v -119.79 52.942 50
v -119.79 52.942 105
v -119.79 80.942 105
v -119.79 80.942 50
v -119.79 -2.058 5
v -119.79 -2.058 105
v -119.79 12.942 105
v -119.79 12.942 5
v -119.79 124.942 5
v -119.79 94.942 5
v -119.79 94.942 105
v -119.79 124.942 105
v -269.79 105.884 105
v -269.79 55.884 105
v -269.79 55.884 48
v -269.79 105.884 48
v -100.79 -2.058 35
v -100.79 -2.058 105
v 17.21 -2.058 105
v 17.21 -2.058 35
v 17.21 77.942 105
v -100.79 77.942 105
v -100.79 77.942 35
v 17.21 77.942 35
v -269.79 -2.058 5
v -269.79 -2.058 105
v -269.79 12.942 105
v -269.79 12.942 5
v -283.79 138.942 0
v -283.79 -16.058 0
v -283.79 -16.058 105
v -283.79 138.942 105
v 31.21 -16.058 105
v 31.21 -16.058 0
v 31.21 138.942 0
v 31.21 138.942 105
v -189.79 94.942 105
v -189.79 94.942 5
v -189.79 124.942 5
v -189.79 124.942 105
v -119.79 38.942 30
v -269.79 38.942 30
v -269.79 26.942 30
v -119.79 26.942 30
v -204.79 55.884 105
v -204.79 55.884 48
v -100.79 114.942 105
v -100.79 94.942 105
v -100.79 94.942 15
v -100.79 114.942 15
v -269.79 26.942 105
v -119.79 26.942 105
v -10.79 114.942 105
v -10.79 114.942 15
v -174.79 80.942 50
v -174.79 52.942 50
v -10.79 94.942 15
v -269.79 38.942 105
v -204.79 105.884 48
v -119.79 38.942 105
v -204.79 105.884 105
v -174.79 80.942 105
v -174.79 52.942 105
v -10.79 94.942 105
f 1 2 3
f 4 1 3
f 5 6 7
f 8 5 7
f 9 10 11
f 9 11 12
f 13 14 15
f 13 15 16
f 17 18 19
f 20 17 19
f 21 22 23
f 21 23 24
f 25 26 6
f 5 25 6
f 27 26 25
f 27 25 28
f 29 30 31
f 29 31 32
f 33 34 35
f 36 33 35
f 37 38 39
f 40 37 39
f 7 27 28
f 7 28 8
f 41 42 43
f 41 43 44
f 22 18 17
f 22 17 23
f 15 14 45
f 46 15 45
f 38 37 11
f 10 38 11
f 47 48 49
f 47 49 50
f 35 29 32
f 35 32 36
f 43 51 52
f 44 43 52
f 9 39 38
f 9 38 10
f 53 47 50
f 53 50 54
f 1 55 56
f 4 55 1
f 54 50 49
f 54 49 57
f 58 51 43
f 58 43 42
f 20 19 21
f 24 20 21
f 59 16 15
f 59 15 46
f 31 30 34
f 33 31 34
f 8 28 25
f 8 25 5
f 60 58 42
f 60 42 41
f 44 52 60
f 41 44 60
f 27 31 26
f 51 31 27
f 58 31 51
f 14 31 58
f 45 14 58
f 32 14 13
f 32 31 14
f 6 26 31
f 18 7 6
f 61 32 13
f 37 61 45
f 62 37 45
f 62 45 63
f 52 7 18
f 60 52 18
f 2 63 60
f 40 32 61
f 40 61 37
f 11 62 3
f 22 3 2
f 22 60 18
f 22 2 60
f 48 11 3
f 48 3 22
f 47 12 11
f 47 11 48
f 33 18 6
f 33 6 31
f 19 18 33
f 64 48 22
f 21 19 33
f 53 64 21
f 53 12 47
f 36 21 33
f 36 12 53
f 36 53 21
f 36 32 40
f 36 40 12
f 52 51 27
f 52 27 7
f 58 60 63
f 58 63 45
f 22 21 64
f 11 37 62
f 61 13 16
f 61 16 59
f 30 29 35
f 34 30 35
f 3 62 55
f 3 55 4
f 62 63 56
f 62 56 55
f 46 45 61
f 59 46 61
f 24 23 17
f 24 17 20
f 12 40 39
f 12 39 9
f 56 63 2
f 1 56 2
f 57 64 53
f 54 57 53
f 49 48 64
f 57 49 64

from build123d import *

# Parameters (mm, degrees)
F0_W      = 315
F0_H      = 155
F1_DEPTH  = 105
F2_W      = 118
F2_H      = 80
F3_DEPTH  = 70
F4_W      = 65
F4_H      = 50
F5_DEPTH  = 57
F6_W      = 150
F6_H      = 15
F7_DEPTH  = 100
F8_W      = 150
F8_H      = 12
F9_DEPTH  = 75
F10_W     = 55
F10_H     = 28
F11_DEPTH = 55
F12_W     = 70
F12_H     = 30
F13_DEPTH = 100
F14_W     = 90
F14_H     = 20
F15_DEPTH = 90


with BuildPart() as f1:
    # F0 (on Top) → F1 (new body)
    with BuildSketch(Plane.XY):
        with Locations((-126.290321, 61.441531)):
            Rectangle(F0_W, F0_H)
    extrude(amount=F1_DEPTH)

    # F2 (on face) → F3 (cut)
    with BuildSketch(Plane.XY.offset(105)):
        with Locations((-41.790321, 37.941531)):
            Rectangle(F2_W, F2_H)
    extrude(amount=-F3_DEPTH, mode=Mode.SUBTRACT)

    # F4 (on face) → F5 (cut)
    with BuildSketch(Plane.XY.offset(105)):
        with Locations((-237.290321, 80.884401)):
            Rectangle(F4_W, F4_H)
    extrude(amount=-F5_DEPTH, mode=Mode.SUBTRACT)

    # F6 (on face) → F7 (cut)
    with BuildSketch(Plane.XY.offset(105)):
        with Locations((-194.790321, 5.441531)):
            Rectangle(F6_W, F6_H)
    extrude(amount=-F7_DEPTH, mode=Mode.SUBTRACT)

    # F8 (on face) → F9 (cut)
    with BuildSketch(Plane.XY.offset(105)):
        with Locations((-194.790321, 32.941531)):
            Rectangle(F8_W, F8_H)
    extrude(amount=-F9_DEPTH, mode=Mode.SUBTRACT)

    # F10 (on face) → F11 (cut)
    with BuildSketch(Plane.XY.offset(105)):
        with Locations((-147.290321, 66.941531)):
            Rectangle(F10_W, F10_H)
    extrude(amount=-F11_DEPTH, mode=Mode.SUBTRACT)

    # F12 (on face) → F13 (cut)
    with BuildSketch(Plane.XY.offset(105)):
        with Locations((-154.790321, 109.941531)):
            Rectangle(F12_W, F12_H)
    extrude(amount=-F13_DEPTH, mode=Mode.SUBTRACT)

    # F14 (on face) → F15 (cut)
    with BuildSketch(Plane.XY.offset(105)):
        with Locations((-55.790321, 104.941531)):
            Rectangle(F14_W, F14_H)
    extrude(amount=-F15_DEPTH, mode=Mode.SUBTRACT)


solid = f1.part
